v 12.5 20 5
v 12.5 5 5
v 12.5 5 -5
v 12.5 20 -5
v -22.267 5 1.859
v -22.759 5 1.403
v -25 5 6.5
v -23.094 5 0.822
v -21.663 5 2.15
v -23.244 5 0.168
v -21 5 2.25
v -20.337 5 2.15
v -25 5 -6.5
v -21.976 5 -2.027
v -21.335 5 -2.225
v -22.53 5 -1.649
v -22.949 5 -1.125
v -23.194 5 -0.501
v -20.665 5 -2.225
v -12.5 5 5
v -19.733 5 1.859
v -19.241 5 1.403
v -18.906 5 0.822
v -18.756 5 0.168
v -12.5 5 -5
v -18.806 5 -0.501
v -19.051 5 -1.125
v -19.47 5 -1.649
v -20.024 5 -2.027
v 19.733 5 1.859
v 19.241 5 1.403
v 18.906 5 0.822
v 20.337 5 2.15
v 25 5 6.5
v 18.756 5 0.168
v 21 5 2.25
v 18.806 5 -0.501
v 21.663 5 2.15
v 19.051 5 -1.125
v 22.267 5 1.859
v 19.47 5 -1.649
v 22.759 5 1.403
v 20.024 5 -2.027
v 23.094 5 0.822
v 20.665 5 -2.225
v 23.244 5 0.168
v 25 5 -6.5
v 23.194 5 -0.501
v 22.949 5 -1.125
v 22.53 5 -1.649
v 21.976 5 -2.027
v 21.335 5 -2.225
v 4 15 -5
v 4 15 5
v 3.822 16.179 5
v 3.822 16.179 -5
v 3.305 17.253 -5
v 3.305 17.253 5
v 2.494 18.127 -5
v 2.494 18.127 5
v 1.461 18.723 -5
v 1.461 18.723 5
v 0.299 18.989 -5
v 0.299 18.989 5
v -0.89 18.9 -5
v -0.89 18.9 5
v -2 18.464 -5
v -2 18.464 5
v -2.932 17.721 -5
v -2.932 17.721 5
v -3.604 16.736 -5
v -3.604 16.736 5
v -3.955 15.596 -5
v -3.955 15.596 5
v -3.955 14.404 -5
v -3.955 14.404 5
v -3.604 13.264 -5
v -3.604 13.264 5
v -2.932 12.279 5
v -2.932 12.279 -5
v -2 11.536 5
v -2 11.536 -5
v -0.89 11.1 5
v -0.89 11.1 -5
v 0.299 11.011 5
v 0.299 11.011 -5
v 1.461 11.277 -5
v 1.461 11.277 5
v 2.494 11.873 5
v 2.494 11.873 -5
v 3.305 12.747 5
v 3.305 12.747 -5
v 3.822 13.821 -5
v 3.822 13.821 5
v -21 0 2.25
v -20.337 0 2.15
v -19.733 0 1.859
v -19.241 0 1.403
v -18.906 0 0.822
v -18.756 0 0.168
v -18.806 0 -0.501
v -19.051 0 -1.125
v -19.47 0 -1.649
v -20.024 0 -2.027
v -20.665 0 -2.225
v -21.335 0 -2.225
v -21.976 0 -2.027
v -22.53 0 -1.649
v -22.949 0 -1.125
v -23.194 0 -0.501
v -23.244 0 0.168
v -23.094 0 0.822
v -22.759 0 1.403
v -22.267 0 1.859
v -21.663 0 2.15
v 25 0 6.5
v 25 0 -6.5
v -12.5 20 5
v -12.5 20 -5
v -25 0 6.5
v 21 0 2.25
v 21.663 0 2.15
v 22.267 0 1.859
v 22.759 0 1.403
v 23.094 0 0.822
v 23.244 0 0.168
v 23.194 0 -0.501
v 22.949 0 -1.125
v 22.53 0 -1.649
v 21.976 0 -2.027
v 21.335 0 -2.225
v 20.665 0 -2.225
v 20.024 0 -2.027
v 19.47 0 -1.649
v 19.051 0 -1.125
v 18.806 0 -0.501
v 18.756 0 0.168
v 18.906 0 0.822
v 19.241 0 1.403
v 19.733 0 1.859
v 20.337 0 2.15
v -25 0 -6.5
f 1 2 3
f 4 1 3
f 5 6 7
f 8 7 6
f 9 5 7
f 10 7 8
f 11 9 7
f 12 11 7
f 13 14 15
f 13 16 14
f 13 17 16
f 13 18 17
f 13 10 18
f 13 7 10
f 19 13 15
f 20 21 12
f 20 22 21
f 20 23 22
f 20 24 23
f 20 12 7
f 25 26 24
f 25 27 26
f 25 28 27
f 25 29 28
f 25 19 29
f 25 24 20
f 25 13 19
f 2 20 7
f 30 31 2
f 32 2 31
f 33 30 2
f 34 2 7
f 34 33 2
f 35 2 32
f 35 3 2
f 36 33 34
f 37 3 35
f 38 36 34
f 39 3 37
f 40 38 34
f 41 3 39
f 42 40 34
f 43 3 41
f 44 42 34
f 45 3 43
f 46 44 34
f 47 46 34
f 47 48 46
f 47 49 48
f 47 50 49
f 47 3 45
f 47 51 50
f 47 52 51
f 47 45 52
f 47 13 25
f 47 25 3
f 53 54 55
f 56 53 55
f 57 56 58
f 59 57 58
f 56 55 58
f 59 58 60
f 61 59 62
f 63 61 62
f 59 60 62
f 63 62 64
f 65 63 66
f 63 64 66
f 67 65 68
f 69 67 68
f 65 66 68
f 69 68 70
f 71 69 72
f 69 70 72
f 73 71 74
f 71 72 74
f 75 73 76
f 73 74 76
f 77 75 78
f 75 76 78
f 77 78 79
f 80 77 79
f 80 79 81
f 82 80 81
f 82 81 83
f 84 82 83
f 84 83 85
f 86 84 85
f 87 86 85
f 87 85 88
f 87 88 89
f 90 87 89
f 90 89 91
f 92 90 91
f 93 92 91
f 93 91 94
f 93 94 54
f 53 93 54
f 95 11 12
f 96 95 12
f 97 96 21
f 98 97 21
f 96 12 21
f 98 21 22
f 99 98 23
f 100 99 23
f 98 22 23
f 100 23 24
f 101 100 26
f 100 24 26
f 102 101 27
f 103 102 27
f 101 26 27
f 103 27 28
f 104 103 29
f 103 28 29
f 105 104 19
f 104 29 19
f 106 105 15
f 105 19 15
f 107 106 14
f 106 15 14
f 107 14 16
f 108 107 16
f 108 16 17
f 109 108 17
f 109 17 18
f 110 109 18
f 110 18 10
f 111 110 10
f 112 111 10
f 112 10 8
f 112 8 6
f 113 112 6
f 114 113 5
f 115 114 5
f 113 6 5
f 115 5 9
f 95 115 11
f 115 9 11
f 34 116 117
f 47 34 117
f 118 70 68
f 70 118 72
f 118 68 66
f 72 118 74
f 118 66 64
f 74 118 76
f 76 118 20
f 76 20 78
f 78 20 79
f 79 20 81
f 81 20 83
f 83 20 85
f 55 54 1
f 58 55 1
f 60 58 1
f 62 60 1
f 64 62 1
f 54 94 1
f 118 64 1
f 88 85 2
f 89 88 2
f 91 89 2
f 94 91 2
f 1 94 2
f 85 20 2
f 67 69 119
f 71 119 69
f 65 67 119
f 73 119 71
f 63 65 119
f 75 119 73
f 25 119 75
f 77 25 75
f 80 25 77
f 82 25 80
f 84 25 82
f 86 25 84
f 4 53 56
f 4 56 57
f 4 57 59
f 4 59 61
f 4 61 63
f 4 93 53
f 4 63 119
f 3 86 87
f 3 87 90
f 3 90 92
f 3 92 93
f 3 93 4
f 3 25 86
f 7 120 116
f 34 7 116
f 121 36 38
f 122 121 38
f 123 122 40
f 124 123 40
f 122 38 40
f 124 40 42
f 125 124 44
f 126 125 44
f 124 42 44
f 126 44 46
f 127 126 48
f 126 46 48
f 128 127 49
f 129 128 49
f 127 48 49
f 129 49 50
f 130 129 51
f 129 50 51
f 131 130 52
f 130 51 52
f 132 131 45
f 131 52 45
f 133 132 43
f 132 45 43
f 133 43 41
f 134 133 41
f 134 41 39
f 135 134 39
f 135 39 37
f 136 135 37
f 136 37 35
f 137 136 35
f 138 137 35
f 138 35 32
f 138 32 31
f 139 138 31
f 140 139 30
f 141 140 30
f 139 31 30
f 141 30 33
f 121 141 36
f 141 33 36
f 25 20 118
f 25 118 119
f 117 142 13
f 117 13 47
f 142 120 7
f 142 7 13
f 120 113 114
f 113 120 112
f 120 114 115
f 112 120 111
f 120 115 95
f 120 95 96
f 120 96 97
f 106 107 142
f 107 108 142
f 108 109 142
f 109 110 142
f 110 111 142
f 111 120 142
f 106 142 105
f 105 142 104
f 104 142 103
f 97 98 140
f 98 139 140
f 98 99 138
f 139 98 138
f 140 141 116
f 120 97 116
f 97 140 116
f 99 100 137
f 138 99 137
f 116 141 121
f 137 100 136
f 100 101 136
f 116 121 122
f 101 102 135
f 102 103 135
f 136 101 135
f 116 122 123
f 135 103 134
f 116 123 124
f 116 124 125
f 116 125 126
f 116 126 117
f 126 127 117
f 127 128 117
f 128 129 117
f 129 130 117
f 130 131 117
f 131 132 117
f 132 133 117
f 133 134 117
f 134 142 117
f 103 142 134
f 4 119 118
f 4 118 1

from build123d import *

# Parameters (mm, degrees)
SKETCH1_W           = 50
SKETCH1_H           = 13
BOSS_EXTRUDE1_DEPTH = 5
SKETCH2_R           = 2.25
CUT_EXTRUDE1_DEPTH  = 5
SKETCH3_W           = 25
SKETCH3_H           = 10
BOSS_EXTRUDE2_DEPTH = 15
SKETCH4_R           = 4
CUT_EXTRUDE2_DEPTH  = 15


with BuildPart() as part:
    # Sketch1 → Boss-Extrude1 (new body)
    with BuildSketch(Plane(origin=(0, 0, 0), x_dir=(1, 0, 0), z_dir=(0, 1, 0))):
        Rectangle(SKETCH1_W, SKETCH1_H)
    extrude(amount=BOSS_EXTRUDE1_DEPTH)

    # Sketch2 → Cut-Extrude1 (cut)
    with BuildSketch(Plane(origin=(0, 5, 0), x_dir=(1, 0, 0), z_dir=(0, 1, 0))):
        with Locations(Location((-21, 0, 0), (0, 0, 270))):
            Circle(SKETCH2_R)
        with Locations(Location((21, 0, 0), (0, 0, 270))):
            Circle(SKETCH2_R)
    extrude(amount=-CUT_EXTRUDE1_DEPTH, mode=Mode.SUBTRACT)

    # Sketch3 → Boss-Extrude2 (add)
    with BuildSketch(Plane(origin=(0, 5, 0), x_dir=(1, 0, 0), z_dir=(0, 1, 0))):
        Rectangle(SKETCH3_W, SKETCH3_H)
    extrude(amount=BOSS_EXTRUDE2_DEPTH)

    # Sketch4 → Cut-Extrude2 (cut)
    with BuildSketch(Plane.XY.offset(5)):
        with Locations((0, 15)):
            Circle(SKETCH4_R)
    extrude(amount=-CUT_EXTRUDE2_DEPTH, mode=Mode.SUBTRACT)


solid = part.part
